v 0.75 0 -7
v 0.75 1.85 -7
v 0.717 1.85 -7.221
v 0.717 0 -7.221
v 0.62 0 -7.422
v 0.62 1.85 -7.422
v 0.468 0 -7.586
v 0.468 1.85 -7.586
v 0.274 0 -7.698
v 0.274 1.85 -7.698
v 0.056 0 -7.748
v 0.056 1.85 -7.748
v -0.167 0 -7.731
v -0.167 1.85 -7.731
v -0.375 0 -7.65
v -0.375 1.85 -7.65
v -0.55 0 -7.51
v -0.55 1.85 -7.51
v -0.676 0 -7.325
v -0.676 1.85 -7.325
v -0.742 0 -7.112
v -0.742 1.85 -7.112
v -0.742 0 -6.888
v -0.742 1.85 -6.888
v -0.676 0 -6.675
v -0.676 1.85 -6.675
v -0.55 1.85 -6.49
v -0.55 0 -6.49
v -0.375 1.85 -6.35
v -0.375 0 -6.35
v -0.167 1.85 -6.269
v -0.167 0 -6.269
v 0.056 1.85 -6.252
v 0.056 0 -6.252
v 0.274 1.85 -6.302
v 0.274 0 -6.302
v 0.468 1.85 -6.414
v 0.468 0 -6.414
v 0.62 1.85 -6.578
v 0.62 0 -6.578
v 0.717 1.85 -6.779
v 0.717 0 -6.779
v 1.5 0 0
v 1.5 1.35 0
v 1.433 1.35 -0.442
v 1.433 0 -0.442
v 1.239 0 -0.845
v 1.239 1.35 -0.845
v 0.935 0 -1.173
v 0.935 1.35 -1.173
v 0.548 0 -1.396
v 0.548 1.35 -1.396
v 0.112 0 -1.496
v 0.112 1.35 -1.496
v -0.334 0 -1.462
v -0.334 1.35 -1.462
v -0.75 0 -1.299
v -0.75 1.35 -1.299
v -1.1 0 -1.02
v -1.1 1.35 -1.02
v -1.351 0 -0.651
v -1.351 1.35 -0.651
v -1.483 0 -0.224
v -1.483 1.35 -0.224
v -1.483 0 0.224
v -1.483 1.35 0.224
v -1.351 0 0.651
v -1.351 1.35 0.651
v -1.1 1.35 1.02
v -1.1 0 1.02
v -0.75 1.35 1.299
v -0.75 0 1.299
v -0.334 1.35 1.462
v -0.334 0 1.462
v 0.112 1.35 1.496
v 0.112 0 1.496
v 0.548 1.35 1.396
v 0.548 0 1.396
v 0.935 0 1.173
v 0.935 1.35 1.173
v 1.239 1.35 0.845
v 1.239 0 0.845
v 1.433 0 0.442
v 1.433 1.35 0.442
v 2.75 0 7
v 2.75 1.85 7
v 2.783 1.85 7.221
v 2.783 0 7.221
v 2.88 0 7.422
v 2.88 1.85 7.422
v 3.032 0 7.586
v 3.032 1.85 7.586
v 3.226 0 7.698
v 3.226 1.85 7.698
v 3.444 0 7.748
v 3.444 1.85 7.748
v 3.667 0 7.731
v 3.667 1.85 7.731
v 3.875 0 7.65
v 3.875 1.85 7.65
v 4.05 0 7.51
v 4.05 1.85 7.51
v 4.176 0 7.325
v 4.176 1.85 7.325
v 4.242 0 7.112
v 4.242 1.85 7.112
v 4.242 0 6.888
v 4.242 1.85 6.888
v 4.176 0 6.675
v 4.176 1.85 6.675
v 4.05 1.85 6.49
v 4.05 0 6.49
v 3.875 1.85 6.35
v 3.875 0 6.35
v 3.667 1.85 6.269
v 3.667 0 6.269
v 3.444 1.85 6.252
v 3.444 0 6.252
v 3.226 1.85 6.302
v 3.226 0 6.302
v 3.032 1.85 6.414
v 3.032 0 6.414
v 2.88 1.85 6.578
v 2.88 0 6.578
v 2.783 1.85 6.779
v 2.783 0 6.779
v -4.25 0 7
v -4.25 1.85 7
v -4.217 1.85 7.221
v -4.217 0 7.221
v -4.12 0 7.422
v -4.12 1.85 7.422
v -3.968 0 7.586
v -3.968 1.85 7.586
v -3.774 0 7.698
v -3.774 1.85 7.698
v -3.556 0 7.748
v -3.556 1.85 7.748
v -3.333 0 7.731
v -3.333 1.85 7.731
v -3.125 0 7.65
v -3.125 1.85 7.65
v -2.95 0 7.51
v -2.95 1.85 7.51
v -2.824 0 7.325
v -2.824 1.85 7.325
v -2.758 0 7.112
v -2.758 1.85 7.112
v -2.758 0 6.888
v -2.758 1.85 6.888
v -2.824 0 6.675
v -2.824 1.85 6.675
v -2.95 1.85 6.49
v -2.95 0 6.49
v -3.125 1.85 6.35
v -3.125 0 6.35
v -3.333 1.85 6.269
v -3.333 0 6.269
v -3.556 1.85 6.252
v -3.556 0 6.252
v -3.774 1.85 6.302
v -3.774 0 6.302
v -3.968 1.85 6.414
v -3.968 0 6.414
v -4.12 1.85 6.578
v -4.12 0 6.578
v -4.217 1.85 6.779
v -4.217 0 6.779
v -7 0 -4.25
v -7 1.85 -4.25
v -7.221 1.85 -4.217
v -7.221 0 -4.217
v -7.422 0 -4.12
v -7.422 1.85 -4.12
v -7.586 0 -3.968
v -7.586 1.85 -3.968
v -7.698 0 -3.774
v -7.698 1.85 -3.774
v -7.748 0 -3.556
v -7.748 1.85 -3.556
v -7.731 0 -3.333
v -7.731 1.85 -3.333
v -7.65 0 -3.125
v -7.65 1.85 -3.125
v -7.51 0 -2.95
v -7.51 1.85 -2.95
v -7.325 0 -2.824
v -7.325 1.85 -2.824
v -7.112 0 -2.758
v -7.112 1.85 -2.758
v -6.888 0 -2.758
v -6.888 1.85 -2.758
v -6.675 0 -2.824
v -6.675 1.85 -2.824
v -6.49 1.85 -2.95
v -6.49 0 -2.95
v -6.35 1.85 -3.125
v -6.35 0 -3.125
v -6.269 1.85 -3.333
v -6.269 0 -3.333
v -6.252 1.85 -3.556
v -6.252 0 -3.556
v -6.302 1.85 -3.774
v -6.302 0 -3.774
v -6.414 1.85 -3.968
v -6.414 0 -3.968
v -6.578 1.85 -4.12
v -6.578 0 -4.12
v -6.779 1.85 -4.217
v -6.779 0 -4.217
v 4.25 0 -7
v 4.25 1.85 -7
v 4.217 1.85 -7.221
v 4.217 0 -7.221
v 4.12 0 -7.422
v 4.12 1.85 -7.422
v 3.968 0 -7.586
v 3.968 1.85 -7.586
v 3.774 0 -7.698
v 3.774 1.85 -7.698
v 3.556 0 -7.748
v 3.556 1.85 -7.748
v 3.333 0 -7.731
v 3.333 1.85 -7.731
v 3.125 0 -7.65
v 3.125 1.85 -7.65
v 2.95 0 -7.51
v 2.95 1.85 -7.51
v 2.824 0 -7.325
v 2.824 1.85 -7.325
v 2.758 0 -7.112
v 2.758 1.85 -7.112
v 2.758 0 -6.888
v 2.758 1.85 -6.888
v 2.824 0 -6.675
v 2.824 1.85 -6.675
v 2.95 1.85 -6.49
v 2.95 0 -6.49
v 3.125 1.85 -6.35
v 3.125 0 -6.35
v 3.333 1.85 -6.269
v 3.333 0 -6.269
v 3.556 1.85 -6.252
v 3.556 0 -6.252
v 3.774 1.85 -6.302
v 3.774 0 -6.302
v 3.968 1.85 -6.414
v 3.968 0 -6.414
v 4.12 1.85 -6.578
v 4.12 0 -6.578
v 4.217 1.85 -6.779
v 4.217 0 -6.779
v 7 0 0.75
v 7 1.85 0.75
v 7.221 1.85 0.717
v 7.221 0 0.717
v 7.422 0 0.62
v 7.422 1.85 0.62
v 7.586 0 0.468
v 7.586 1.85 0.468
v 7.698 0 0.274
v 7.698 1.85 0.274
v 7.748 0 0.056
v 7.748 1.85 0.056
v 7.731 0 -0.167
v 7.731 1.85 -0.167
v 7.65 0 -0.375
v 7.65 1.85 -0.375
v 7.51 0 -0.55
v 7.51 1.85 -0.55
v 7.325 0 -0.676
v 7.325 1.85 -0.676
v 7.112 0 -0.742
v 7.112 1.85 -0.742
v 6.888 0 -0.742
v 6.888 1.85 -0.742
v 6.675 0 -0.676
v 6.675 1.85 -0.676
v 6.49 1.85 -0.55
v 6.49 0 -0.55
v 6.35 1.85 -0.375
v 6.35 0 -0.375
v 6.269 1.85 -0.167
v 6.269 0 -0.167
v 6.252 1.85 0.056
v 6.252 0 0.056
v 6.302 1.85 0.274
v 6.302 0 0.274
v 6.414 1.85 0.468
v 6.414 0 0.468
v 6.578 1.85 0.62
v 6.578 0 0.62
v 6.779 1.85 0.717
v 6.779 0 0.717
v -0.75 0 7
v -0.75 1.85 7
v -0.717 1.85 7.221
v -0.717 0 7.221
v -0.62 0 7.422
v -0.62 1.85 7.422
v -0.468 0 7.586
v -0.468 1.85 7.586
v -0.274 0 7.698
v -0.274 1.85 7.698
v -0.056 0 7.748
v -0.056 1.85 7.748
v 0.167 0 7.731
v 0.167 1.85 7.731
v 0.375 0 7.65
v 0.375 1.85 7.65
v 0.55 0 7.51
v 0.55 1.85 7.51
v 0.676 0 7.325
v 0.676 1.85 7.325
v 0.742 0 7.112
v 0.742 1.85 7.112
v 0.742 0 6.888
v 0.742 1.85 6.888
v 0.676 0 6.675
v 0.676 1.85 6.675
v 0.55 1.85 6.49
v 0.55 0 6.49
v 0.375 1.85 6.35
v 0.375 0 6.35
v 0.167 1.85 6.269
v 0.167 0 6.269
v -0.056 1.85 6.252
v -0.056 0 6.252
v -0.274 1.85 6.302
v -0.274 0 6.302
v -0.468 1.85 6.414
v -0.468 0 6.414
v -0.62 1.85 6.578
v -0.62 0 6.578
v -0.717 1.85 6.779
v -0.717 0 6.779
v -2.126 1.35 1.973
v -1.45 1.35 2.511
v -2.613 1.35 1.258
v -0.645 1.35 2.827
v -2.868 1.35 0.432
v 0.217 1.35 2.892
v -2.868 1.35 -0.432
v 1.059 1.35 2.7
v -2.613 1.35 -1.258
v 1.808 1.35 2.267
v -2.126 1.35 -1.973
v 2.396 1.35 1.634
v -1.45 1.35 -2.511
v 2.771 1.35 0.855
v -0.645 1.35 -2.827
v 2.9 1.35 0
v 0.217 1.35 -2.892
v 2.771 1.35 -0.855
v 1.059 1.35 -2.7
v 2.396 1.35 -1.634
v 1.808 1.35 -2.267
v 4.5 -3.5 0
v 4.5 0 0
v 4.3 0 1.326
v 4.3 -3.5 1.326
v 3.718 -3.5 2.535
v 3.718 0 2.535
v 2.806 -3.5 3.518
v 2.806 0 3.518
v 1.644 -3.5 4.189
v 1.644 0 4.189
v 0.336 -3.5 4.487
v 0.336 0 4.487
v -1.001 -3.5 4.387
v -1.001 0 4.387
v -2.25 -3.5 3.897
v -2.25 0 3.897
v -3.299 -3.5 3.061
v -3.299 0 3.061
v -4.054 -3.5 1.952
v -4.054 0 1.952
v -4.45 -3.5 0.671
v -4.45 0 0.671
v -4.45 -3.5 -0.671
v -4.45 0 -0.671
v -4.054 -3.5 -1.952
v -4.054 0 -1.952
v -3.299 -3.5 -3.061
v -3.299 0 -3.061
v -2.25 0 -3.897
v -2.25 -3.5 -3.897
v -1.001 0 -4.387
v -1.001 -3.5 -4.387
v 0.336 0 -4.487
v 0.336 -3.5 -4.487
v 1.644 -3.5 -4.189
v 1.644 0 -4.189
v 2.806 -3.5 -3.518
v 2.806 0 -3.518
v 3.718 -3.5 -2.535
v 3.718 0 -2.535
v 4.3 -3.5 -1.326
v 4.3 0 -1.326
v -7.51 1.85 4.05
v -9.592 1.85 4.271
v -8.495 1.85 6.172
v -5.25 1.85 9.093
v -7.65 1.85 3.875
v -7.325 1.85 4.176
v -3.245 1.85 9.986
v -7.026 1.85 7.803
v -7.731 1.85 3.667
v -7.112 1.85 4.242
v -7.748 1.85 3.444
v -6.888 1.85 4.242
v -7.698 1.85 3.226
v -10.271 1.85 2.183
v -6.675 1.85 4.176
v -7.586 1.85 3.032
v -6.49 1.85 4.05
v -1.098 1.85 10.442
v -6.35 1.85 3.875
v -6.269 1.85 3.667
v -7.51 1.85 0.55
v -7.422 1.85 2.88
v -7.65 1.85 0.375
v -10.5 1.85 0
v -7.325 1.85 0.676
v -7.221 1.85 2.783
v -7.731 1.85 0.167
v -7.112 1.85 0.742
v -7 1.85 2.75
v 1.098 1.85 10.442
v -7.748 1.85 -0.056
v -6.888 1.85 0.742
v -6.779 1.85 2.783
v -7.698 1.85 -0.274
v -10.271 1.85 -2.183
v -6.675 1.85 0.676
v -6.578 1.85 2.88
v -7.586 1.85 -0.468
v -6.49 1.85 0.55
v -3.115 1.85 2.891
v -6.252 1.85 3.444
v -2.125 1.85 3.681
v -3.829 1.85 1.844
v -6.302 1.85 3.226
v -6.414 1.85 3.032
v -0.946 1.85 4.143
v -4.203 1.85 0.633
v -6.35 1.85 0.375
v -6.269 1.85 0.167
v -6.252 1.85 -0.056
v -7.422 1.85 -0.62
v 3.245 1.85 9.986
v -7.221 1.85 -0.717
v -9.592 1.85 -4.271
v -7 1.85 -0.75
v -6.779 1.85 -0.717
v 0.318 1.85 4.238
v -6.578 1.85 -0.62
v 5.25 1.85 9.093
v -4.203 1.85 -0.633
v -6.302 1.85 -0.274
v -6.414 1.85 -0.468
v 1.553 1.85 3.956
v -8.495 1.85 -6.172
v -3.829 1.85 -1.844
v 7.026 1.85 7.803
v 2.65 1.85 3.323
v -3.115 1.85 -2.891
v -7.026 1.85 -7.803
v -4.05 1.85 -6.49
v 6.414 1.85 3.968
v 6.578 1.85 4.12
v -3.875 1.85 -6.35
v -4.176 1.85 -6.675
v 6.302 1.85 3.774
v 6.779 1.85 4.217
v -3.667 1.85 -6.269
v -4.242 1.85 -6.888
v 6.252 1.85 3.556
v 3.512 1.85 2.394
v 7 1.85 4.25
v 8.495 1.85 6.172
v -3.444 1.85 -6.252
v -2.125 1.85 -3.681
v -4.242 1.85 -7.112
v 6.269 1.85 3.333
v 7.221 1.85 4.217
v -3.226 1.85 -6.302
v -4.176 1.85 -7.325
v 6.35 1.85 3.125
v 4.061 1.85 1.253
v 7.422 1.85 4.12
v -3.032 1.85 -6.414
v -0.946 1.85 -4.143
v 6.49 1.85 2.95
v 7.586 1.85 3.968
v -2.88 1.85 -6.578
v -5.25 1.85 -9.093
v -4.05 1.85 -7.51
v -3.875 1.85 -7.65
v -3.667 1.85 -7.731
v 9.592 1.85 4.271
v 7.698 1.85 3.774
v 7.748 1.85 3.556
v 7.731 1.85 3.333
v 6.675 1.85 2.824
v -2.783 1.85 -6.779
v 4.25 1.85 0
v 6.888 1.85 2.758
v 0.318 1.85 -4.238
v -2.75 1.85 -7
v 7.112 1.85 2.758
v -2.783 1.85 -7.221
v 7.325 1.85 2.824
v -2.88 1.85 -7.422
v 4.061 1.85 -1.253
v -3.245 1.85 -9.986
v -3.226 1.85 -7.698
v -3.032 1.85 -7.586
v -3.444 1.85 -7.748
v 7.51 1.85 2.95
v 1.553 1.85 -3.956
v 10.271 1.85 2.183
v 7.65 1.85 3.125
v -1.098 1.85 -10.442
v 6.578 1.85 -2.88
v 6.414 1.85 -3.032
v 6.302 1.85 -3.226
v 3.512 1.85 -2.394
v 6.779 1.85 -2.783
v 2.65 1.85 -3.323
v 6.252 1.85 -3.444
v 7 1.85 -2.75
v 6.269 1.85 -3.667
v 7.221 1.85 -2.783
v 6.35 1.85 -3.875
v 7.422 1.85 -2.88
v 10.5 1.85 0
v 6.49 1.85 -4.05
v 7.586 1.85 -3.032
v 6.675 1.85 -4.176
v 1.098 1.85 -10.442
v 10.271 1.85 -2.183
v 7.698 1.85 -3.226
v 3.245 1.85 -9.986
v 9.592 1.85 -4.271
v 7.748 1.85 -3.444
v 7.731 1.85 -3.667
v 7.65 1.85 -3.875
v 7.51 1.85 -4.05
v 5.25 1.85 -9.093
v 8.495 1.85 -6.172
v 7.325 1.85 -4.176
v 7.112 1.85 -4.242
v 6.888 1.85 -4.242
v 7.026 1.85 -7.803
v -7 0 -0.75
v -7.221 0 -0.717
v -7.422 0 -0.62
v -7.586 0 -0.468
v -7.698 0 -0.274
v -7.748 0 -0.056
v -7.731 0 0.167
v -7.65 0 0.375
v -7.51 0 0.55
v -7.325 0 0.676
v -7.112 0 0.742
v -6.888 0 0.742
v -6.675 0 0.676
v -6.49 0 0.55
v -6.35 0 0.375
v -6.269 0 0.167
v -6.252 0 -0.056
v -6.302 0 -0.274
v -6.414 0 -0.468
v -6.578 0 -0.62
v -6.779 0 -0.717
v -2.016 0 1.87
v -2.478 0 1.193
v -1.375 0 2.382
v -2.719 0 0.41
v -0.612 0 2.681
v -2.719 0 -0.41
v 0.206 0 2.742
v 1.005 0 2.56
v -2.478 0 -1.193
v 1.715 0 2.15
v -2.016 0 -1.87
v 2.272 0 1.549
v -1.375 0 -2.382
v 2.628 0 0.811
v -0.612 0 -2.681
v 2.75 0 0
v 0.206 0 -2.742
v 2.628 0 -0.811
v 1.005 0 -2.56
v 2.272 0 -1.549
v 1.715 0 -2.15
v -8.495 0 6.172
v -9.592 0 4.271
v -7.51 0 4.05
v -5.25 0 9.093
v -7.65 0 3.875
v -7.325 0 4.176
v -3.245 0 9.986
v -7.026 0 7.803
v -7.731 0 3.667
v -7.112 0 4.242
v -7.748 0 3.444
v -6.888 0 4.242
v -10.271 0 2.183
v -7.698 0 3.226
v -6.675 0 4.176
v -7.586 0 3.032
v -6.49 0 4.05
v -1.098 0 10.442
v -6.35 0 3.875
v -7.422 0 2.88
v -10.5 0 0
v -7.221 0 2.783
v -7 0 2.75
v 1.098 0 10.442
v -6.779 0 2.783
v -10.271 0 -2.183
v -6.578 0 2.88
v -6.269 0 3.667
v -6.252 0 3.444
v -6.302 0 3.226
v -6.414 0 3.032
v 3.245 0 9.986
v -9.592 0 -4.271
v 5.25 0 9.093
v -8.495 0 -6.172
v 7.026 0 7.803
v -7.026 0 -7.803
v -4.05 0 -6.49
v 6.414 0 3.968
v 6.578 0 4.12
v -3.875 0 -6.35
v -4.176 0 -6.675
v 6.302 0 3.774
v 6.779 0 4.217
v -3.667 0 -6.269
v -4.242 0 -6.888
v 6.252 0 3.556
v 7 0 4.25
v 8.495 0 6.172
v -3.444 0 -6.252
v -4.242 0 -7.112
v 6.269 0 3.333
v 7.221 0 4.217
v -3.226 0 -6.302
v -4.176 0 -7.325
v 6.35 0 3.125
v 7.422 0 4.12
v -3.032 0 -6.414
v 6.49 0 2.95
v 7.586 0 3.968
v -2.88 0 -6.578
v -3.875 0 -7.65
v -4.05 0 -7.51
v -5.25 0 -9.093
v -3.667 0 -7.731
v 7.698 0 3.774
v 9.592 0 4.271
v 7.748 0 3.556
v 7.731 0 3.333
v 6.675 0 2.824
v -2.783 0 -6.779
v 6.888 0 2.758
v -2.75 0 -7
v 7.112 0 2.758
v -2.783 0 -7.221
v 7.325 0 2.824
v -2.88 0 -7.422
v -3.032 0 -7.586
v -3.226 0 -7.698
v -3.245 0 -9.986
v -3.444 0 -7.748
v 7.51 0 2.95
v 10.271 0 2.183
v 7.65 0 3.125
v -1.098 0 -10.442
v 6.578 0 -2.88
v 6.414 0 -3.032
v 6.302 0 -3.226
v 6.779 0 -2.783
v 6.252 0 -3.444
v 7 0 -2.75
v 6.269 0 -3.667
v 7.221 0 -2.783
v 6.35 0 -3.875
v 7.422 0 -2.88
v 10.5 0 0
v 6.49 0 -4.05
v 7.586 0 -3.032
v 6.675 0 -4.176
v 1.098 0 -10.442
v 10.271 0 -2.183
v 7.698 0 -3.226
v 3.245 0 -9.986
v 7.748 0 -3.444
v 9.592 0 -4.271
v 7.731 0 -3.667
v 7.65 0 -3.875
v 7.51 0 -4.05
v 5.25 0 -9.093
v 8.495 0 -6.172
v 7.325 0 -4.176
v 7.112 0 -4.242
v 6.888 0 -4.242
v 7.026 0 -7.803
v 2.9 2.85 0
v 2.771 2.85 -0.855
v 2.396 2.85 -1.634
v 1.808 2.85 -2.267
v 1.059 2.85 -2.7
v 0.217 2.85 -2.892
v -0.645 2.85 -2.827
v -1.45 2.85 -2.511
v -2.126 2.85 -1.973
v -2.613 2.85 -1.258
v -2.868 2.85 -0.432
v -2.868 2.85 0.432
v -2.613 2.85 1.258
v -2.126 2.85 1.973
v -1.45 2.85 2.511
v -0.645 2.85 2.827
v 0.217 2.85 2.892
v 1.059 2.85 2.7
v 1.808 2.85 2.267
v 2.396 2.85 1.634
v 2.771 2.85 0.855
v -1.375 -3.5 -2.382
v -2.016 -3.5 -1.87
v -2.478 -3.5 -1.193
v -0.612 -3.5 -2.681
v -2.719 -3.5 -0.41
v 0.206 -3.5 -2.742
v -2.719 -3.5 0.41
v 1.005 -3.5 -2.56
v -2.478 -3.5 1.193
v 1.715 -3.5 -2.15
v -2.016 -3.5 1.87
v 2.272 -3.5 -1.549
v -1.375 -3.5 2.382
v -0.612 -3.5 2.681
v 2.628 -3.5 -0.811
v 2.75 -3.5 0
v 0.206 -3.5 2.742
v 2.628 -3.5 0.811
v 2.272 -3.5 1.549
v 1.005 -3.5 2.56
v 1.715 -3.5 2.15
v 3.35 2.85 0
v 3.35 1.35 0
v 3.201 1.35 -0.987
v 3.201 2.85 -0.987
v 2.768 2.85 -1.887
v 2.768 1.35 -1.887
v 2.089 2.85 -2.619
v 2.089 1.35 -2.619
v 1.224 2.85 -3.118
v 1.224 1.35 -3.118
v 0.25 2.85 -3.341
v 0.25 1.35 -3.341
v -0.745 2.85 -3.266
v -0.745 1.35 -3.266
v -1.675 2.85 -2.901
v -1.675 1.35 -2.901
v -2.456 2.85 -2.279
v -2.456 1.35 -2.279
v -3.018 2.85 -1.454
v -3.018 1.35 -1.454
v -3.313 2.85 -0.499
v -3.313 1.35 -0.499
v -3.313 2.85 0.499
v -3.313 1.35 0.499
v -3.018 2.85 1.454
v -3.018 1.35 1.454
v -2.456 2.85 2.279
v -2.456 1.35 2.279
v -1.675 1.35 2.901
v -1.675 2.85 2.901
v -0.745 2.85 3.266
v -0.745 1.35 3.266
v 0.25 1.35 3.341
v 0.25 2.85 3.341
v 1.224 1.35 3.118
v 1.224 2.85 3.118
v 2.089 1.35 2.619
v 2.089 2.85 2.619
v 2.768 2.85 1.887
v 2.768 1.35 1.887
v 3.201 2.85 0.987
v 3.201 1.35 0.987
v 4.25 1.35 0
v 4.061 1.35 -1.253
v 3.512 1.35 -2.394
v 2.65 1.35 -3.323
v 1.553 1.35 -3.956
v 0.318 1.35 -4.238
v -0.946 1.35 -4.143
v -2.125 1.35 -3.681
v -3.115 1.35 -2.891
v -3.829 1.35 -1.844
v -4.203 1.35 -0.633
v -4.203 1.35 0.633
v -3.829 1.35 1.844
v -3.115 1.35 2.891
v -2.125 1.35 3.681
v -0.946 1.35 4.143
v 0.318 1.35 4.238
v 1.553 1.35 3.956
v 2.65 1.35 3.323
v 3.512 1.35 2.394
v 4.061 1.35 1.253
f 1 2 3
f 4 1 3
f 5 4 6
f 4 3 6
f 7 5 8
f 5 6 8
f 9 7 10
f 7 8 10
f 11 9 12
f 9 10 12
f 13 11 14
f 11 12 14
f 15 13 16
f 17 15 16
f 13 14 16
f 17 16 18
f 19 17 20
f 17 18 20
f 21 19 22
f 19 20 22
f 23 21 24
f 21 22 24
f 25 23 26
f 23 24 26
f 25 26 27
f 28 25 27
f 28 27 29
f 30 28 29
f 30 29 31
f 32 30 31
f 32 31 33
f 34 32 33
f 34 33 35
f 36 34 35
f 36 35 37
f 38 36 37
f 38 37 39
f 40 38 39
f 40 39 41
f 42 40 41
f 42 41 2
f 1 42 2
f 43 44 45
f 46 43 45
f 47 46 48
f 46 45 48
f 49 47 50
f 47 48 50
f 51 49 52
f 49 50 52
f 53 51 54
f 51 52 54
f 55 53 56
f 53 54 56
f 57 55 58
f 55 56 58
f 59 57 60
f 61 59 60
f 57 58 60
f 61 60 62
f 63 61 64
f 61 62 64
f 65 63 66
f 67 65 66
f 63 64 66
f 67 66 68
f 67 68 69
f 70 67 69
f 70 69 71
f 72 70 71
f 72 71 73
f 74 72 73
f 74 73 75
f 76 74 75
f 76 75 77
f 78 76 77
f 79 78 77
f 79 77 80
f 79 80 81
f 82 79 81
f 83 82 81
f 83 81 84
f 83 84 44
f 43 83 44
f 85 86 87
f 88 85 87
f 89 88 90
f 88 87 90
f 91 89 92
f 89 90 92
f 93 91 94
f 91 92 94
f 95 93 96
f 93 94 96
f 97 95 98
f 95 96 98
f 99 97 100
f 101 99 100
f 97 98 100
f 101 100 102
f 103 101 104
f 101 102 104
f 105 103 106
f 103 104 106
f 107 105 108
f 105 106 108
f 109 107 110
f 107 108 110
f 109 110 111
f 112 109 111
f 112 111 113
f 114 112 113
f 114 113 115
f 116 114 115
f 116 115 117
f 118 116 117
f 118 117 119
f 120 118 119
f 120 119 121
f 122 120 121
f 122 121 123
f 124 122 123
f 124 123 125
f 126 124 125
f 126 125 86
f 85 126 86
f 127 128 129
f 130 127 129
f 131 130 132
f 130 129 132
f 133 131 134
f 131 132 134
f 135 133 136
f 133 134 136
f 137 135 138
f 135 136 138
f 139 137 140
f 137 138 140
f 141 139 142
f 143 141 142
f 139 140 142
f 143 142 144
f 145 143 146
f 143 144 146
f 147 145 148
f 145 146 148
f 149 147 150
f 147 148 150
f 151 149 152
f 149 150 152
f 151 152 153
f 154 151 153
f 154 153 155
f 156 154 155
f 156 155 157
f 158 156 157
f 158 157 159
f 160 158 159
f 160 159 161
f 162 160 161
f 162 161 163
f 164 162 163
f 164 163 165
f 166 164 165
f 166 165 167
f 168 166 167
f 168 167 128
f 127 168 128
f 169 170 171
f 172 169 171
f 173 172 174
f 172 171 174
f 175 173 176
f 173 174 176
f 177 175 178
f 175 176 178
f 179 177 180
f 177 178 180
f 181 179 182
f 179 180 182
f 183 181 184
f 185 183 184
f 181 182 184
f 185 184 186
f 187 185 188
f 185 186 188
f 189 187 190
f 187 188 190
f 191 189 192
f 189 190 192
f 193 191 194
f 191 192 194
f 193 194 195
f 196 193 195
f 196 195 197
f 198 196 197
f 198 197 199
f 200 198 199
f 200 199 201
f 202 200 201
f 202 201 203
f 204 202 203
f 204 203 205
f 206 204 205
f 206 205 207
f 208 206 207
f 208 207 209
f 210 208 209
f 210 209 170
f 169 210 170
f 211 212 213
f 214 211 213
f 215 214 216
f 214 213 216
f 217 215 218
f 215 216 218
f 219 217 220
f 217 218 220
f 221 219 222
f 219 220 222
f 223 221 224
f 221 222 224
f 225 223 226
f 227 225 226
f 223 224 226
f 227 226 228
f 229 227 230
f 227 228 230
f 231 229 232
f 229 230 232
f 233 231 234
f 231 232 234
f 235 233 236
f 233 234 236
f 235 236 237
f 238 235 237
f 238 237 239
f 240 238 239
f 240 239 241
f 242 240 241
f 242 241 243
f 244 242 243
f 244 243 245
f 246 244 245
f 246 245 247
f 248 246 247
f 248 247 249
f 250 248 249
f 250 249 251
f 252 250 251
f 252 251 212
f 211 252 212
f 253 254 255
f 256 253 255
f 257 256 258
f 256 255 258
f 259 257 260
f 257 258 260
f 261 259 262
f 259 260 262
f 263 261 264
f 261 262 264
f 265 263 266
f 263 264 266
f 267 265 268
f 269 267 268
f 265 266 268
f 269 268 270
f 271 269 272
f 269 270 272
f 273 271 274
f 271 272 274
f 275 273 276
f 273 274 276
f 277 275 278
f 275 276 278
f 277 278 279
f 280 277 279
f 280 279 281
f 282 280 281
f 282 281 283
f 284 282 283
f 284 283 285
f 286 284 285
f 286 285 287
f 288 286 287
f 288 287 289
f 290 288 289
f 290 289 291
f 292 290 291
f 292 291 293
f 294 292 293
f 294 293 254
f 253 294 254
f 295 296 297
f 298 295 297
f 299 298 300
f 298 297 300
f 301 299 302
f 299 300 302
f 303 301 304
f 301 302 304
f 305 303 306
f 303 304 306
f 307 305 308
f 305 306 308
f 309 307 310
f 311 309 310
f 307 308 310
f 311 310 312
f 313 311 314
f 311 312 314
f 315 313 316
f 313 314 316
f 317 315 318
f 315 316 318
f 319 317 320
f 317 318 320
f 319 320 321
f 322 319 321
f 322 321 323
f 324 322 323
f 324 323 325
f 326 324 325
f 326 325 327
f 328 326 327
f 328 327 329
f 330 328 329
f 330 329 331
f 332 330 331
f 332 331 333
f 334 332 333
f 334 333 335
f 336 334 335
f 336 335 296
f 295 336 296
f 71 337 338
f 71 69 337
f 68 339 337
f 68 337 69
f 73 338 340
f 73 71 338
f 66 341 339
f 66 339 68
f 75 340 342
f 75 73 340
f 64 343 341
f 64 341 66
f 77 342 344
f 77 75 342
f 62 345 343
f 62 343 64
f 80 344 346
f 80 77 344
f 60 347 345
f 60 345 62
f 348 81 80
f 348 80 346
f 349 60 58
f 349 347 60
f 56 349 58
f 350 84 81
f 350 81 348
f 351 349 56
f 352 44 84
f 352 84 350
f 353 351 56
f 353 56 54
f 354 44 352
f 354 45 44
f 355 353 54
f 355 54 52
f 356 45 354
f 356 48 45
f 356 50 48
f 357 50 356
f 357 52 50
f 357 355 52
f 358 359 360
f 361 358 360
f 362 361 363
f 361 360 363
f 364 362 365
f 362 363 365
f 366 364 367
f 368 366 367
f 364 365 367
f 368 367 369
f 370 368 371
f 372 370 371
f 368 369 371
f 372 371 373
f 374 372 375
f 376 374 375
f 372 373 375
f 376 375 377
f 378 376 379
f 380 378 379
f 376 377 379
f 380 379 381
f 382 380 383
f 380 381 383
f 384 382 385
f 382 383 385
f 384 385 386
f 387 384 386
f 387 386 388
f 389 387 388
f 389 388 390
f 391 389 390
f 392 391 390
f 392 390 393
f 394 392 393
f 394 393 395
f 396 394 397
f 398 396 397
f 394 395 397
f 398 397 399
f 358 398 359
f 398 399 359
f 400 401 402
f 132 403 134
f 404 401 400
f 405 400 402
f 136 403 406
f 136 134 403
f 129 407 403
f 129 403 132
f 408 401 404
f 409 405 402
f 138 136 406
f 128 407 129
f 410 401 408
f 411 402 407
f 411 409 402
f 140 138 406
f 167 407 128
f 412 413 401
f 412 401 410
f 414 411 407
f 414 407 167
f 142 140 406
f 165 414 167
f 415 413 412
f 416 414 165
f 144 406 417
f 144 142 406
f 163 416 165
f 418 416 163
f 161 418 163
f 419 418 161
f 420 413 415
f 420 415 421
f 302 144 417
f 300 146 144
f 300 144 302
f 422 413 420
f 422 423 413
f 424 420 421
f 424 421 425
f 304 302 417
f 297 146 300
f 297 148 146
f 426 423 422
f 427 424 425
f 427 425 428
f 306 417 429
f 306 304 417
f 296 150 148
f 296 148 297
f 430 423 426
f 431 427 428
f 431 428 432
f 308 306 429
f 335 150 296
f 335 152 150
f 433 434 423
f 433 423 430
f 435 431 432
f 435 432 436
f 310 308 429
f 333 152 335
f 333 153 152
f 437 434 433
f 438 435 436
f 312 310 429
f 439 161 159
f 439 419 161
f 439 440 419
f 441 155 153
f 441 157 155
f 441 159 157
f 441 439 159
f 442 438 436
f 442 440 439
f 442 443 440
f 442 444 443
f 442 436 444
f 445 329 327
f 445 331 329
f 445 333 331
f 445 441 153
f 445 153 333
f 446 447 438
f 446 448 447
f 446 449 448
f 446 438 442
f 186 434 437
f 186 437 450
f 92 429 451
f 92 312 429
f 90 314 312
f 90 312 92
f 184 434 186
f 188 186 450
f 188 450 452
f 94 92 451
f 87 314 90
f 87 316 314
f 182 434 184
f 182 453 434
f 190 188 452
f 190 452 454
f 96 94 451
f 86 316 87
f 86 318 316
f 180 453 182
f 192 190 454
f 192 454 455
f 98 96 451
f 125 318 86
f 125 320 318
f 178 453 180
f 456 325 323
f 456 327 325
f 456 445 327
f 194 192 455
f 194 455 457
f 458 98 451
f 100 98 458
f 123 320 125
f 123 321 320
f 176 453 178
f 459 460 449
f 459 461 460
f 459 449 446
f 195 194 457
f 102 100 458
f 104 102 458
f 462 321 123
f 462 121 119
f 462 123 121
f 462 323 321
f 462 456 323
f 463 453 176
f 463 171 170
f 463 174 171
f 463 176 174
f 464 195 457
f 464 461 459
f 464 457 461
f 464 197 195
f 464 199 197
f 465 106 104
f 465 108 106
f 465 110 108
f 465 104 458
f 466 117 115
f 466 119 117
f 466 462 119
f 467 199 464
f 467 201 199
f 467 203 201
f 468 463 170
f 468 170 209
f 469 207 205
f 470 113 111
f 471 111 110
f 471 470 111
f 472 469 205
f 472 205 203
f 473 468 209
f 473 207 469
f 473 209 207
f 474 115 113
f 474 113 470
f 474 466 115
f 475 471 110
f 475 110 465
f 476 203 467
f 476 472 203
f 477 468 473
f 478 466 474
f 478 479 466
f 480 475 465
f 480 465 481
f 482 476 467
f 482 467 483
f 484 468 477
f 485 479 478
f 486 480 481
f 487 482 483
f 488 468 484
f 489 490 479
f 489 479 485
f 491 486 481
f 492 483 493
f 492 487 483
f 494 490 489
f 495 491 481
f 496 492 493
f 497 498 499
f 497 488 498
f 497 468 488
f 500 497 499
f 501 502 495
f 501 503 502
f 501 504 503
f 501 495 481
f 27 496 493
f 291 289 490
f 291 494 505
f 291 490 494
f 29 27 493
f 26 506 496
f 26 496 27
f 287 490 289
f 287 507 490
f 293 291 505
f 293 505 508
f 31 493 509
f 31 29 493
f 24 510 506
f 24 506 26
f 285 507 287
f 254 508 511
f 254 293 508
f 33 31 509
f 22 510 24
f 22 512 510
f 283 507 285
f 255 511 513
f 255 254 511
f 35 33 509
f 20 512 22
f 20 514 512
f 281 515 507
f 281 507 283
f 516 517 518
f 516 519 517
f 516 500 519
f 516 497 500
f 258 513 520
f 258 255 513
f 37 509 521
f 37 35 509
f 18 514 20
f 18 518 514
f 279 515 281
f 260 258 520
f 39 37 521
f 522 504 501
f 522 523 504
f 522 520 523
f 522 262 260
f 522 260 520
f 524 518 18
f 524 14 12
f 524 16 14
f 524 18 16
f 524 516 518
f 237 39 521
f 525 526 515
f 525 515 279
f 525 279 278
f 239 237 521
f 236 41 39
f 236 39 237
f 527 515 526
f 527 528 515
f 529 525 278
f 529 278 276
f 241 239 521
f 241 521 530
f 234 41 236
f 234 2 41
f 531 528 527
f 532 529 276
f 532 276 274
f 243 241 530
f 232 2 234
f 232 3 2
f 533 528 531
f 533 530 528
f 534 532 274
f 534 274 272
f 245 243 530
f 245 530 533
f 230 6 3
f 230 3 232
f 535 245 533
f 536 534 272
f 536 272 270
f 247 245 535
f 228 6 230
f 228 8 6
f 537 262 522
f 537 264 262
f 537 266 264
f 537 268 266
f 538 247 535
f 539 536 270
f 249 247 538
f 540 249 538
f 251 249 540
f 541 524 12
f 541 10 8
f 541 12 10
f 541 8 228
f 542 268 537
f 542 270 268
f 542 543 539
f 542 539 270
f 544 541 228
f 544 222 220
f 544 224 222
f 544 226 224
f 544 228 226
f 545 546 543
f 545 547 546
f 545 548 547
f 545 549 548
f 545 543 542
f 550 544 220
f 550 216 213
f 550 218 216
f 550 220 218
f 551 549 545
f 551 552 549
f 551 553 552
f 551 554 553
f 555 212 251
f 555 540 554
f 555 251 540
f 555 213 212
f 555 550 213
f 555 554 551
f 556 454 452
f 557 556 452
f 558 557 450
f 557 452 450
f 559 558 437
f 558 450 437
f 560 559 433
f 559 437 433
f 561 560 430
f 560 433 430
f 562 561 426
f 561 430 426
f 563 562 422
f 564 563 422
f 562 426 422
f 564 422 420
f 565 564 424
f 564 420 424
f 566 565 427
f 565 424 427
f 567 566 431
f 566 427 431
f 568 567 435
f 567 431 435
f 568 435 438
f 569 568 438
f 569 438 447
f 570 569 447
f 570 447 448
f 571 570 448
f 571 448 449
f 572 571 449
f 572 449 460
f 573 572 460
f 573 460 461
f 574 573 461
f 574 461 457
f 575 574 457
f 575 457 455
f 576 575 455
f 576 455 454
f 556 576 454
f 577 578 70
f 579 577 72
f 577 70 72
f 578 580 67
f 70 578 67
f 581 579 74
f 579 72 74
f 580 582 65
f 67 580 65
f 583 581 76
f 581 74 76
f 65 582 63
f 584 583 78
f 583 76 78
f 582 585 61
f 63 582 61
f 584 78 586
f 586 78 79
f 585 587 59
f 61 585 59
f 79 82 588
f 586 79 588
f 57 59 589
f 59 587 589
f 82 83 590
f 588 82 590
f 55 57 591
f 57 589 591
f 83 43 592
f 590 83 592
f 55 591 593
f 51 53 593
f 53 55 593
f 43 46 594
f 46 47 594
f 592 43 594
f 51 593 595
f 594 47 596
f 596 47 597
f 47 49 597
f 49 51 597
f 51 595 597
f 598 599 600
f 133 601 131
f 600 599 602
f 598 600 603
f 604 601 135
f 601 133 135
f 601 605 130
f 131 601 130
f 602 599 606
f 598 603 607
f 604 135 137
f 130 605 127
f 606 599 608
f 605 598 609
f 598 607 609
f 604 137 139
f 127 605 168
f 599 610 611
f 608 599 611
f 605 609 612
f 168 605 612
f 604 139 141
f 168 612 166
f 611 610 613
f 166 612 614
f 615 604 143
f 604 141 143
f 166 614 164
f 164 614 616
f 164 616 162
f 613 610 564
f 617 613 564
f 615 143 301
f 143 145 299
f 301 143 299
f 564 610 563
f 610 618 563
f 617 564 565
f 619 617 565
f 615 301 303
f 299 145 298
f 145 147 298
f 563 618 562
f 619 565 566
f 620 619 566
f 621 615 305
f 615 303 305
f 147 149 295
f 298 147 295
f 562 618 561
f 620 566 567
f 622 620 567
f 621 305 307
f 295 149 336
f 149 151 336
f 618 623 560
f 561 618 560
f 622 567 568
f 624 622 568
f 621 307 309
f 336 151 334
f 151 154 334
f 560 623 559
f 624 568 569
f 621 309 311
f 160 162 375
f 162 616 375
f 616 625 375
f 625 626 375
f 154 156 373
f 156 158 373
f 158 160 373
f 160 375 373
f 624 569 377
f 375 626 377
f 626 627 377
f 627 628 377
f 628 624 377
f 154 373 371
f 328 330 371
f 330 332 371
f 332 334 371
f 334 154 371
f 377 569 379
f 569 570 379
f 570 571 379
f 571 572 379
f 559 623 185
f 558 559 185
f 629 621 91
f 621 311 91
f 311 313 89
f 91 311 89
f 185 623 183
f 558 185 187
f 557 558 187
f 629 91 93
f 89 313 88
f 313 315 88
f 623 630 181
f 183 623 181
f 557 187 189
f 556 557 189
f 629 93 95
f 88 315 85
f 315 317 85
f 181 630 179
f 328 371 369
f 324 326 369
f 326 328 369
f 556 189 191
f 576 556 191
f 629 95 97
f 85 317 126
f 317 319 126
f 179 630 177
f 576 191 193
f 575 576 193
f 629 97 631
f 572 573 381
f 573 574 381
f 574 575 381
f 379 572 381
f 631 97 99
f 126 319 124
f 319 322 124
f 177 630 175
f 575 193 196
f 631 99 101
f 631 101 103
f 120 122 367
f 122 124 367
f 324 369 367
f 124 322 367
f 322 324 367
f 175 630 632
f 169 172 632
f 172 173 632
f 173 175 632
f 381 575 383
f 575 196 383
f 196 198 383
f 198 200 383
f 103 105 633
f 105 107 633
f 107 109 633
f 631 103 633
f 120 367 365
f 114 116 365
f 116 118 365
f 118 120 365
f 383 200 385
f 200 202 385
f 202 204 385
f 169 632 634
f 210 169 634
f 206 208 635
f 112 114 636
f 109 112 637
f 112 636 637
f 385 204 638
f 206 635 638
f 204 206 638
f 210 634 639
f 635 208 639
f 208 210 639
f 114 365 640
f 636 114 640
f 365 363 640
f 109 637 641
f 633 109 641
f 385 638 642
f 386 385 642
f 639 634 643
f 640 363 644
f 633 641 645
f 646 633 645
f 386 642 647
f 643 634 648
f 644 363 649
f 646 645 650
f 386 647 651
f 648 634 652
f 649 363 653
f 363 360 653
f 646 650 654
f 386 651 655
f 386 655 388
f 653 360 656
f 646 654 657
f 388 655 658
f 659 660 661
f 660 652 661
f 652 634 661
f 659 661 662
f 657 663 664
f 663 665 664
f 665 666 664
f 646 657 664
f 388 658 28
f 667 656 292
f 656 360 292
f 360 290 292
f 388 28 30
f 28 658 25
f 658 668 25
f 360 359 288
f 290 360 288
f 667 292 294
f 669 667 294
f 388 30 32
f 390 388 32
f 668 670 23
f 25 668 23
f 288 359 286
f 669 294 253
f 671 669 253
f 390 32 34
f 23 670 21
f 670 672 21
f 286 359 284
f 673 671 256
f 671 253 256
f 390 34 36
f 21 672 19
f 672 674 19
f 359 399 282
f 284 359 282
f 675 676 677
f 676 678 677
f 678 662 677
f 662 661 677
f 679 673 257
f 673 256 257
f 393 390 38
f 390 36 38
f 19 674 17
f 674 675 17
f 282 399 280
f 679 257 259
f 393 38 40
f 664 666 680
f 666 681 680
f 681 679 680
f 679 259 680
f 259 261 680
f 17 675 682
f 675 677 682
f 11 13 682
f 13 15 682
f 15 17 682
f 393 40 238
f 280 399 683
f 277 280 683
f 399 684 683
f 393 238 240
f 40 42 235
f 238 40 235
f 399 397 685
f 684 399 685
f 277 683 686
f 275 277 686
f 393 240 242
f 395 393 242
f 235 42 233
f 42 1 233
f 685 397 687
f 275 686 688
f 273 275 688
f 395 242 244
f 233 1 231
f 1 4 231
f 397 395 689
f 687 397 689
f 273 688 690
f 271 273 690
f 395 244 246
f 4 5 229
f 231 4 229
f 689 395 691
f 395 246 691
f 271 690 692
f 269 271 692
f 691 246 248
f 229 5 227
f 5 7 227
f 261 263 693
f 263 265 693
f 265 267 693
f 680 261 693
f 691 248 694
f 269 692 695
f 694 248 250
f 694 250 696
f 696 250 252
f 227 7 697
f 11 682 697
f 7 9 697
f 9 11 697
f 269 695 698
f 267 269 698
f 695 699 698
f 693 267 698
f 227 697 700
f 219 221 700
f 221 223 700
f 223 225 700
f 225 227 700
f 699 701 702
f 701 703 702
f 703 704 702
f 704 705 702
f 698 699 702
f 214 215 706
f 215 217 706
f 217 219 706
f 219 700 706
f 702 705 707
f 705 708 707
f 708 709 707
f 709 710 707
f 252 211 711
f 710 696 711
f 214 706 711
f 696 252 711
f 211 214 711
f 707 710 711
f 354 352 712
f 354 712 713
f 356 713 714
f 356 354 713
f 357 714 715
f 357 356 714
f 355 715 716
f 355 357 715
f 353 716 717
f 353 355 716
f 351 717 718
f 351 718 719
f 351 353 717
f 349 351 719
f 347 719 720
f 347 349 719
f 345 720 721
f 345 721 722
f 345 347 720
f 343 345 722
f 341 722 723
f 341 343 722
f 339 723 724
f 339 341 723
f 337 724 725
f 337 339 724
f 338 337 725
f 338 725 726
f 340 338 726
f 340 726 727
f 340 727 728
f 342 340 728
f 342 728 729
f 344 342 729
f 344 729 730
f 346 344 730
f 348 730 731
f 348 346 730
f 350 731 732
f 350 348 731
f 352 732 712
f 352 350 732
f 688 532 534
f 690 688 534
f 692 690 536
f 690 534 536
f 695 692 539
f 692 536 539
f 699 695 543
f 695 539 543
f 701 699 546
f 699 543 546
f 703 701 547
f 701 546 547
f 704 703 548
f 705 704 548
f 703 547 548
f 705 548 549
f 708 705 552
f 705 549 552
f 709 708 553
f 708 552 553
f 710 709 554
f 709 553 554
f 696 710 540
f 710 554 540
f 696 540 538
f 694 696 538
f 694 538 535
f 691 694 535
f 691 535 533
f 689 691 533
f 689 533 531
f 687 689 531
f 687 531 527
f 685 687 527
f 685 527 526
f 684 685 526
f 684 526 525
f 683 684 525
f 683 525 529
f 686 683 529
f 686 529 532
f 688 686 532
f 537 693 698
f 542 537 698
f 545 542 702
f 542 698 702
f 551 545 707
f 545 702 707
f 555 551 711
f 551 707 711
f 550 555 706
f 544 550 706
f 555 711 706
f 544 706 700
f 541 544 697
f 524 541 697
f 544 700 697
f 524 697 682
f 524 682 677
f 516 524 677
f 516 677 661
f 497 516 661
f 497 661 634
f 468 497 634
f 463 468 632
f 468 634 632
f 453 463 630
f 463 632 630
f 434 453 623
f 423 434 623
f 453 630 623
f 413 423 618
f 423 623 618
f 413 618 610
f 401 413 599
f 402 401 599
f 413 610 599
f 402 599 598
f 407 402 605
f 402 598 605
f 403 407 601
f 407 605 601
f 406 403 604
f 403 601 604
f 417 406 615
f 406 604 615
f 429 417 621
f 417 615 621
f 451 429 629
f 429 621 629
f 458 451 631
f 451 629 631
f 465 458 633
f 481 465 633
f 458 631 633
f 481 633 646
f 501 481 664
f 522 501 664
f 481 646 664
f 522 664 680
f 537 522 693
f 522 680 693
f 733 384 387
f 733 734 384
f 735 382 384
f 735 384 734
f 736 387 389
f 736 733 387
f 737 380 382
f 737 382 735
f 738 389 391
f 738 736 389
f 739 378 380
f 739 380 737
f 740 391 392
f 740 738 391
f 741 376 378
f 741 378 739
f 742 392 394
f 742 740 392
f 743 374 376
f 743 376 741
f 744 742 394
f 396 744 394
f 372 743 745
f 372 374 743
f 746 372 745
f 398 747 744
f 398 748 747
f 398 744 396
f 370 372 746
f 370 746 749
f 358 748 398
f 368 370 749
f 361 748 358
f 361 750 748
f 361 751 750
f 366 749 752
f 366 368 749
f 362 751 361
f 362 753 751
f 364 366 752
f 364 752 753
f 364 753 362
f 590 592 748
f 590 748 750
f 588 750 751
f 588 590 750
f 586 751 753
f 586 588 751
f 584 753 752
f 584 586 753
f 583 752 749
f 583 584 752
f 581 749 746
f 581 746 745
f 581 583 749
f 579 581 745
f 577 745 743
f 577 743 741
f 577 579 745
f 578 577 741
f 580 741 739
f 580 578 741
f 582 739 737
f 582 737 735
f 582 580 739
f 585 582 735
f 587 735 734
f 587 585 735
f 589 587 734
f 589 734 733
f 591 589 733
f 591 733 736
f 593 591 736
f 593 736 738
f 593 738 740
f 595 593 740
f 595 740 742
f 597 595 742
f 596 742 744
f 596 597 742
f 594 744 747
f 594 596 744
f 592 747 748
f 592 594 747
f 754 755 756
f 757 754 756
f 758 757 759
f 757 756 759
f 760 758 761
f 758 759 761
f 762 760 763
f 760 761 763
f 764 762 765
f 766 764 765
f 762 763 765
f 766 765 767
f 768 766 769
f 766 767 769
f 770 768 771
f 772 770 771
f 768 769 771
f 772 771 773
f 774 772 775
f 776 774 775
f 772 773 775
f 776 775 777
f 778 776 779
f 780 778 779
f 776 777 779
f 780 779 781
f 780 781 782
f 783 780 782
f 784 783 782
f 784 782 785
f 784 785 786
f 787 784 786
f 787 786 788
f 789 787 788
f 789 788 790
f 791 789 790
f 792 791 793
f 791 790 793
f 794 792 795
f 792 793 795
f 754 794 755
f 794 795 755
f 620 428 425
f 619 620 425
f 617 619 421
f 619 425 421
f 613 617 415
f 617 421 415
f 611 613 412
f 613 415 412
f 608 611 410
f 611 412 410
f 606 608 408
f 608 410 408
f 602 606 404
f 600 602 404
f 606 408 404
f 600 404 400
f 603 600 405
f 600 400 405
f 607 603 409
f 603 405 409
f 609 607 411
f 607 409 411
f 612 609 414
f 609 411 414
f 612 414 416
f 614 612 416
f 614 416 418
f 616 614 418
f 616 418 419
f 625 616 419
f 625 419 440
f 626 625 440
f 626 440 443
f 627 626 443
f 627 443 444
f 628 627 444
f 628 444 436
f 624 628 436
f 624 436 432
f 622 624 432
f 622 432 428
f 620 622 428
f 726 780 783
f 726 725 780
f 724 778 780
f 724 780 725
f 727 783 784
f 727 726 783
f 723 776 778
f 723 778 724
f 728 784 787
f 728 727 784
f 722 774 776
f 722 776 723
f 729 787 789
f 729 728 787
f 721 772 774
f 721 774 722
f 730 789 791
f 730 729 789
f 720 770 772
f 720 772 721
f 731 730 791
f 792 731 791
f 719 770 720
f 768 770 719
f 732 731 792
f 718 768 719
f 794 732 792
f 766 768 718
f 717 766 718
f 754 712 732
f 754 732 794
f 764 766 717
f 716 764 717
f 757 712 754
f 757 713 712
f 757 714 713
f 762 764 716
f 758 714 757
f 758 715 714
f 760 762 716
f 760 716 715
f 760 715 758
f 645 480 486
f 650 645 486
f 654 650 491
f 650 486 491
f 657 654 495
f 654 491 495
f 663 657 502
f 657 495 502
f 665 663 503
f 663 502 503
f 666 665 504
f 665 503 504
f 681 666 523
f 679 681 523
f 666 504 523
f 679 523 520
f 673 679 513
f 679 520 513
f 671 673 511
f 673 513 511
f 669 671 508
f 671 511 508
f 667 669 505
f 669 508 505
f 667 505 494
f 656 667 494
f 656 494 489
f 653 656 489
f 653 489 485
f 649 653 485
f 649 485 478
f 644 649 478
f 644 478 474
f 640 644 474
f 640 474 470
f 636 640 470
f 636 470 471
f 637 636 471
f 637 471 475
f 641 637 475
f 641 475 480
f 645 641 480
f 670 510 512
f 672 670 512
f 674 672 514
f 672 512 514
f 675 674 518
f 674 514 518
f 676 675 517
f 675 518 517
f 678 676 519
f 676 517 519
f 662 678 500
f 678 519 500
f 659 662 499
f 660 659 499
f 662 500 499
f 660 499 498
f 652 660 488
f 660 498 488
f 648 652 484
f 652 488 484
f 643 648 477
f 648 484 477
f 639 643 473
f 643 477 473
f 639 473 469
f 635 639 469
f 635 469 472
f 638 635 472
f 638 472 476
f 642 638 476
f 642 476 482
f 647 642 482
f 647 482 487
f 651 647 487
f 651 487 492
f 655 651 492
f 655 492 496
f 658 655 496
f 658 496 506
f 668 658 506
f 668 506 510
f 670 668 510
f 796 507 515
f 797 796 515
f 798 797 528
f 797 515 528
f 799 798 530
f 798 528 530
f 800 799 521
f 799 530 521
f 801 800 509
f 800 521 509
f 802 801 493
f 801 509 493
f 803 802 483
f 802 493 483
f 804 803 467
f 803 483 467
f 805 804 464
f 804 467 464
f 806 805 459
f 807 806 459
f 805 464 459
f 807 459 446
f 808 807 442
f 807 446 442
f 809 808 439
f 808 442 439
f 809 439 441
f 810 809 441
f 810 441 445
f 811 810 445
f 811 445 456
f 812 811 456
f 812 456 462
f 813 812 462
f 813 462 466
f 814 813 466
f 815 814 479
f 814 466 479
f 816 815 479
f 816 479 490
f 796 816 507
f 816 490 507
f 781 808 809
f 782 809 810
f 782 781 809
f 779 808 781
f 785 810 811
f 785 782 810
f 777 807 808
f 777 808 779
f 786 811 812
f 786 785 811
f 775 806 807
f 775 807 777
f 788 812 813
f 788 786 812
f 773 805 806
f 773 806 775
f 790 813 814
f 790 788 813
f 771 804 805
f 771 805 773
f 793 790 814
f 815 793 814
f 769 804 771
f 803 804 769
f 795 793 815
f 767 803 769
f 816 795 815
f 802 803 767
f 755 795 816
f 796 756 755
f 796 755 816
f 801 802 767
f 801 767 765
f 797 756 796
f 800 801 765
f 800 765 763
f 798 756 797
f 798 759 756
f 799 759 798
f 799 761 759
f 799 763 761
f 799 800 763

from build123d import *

# Parameters (mm, degrees)
SKETCH1_R           = 10.5
BOSS_EXTRUDE1_DEPTH = 1.85
SKETCH2_R           = 4.25
CUT_EXTRUDE1_DEPTH  = 0.5
SKETCH3_R           = 3.35
SKETCH3_R_2         = 2.9
BOSS_EXTRUDE2_DEPTH = 1.5
SKETCH4_R           = 4.5
SKETCH4_R_2         = 2.75
BOSS_EXTRUDE3_DEPTH = 3.5
SKETCH5_R           = 1.5
CUT_EXTRUDE2_DEPTH  = 5.85
SKETCH6_R           = 0.75
CUT_EXTRUDE3_DEPTH  = 6.35
CIRPATTERN1_COUNT   = 4


with BuildPart() as part:
    # Sketch1 → Boss-Extrude1 (new body)
    with BuildSketch(Plane(origin=(0, 0, 0), x_dir=(1, 0, 0), z_dir=(0, 1, 0))):
        Circle(SKETCH1_R)
    extrude(amount=BOSS_EXTRUDE1_DEPTH)

    # Sketch2 → Cut-Extrude1 (cut)
    with BuildSketch(Plane(origin=(0, 1.85, 0), x_dir=(1, 0, 0), z_dir=(0, 1, 0))):
        Circle(SKETCH2_R)
    extrude(amount=-CUT_EXTRUDE1_DEPTH, mode=Mode.SUBTRACT)

    # Sketch3 → Boss-Extrude2 (add)
    with BuildSketch(Plane(origin=(0, 1.35, 0), x_dir=(1, 0, 0), z_dir=(0, 1, 0))):
        Circle(SKETCH3_R)
        Circle(SKETCH3_R_2, mode=Mode.SUBTRACT)
    extrude(amount=BOSS_EXTRUDE2_DEPTH)

    # Sketch4 → Boss-Extrude3 (add)
    with BuildSketch(Plane.XZ):
        Circle(SKETCH4_R)
        Circle(SKETCH4_R_2, mode=Mode.SUBTRACT)
    extrude(amount=BOSS_EXTRUDE3_DEPTH)

    # Sketch5 → Cut-Extrude2 (cut, through all)
    with BuildSketch(Plane(origin=(0, 1.35, 0), x_dir=(1, 0, 0), z_dir=(0, 1, 0))):
        Circle(SKETCH5_R)
    extrude(amount=-CUT_EXTRUDE2_DEPTH, mode=Mode.SUBTRACT)

    # Sketch6 → Cut-Extrude3 (cut, through all)
    with BuildSketch(Plane(origin=(0, 1.85, 0), x_dir=(1, 0, 0), z_dir=(0, 1, 0))):
        with Locations((-3.5, 7)):
            Circle(SKETCH6_R)
        with Locations((0, 7)):
            Circle(SKETCH6_R)
        with Locations((3.5, 7)):
            Circle(SKETCH6_R)
    cut_extrude3 = extrude(amount=-CUT_EXTRUDE3_DEPTH, mode=Mode.SUBTRACT)

    # CirPattern1: Cut-Extrude3 ×4 about axis
    cirpattern1_axis = Axis((0, 0, 0), (0, 1, 0))
    for i in range(1, CIRPATTERN1_COUNT):
        add(cut_extrude3.rotate(cirpattern1_axis, i * 360 / CIRPATTERN1_COUNT), mode=Mode.SUBTRACT)


solid = part.part
